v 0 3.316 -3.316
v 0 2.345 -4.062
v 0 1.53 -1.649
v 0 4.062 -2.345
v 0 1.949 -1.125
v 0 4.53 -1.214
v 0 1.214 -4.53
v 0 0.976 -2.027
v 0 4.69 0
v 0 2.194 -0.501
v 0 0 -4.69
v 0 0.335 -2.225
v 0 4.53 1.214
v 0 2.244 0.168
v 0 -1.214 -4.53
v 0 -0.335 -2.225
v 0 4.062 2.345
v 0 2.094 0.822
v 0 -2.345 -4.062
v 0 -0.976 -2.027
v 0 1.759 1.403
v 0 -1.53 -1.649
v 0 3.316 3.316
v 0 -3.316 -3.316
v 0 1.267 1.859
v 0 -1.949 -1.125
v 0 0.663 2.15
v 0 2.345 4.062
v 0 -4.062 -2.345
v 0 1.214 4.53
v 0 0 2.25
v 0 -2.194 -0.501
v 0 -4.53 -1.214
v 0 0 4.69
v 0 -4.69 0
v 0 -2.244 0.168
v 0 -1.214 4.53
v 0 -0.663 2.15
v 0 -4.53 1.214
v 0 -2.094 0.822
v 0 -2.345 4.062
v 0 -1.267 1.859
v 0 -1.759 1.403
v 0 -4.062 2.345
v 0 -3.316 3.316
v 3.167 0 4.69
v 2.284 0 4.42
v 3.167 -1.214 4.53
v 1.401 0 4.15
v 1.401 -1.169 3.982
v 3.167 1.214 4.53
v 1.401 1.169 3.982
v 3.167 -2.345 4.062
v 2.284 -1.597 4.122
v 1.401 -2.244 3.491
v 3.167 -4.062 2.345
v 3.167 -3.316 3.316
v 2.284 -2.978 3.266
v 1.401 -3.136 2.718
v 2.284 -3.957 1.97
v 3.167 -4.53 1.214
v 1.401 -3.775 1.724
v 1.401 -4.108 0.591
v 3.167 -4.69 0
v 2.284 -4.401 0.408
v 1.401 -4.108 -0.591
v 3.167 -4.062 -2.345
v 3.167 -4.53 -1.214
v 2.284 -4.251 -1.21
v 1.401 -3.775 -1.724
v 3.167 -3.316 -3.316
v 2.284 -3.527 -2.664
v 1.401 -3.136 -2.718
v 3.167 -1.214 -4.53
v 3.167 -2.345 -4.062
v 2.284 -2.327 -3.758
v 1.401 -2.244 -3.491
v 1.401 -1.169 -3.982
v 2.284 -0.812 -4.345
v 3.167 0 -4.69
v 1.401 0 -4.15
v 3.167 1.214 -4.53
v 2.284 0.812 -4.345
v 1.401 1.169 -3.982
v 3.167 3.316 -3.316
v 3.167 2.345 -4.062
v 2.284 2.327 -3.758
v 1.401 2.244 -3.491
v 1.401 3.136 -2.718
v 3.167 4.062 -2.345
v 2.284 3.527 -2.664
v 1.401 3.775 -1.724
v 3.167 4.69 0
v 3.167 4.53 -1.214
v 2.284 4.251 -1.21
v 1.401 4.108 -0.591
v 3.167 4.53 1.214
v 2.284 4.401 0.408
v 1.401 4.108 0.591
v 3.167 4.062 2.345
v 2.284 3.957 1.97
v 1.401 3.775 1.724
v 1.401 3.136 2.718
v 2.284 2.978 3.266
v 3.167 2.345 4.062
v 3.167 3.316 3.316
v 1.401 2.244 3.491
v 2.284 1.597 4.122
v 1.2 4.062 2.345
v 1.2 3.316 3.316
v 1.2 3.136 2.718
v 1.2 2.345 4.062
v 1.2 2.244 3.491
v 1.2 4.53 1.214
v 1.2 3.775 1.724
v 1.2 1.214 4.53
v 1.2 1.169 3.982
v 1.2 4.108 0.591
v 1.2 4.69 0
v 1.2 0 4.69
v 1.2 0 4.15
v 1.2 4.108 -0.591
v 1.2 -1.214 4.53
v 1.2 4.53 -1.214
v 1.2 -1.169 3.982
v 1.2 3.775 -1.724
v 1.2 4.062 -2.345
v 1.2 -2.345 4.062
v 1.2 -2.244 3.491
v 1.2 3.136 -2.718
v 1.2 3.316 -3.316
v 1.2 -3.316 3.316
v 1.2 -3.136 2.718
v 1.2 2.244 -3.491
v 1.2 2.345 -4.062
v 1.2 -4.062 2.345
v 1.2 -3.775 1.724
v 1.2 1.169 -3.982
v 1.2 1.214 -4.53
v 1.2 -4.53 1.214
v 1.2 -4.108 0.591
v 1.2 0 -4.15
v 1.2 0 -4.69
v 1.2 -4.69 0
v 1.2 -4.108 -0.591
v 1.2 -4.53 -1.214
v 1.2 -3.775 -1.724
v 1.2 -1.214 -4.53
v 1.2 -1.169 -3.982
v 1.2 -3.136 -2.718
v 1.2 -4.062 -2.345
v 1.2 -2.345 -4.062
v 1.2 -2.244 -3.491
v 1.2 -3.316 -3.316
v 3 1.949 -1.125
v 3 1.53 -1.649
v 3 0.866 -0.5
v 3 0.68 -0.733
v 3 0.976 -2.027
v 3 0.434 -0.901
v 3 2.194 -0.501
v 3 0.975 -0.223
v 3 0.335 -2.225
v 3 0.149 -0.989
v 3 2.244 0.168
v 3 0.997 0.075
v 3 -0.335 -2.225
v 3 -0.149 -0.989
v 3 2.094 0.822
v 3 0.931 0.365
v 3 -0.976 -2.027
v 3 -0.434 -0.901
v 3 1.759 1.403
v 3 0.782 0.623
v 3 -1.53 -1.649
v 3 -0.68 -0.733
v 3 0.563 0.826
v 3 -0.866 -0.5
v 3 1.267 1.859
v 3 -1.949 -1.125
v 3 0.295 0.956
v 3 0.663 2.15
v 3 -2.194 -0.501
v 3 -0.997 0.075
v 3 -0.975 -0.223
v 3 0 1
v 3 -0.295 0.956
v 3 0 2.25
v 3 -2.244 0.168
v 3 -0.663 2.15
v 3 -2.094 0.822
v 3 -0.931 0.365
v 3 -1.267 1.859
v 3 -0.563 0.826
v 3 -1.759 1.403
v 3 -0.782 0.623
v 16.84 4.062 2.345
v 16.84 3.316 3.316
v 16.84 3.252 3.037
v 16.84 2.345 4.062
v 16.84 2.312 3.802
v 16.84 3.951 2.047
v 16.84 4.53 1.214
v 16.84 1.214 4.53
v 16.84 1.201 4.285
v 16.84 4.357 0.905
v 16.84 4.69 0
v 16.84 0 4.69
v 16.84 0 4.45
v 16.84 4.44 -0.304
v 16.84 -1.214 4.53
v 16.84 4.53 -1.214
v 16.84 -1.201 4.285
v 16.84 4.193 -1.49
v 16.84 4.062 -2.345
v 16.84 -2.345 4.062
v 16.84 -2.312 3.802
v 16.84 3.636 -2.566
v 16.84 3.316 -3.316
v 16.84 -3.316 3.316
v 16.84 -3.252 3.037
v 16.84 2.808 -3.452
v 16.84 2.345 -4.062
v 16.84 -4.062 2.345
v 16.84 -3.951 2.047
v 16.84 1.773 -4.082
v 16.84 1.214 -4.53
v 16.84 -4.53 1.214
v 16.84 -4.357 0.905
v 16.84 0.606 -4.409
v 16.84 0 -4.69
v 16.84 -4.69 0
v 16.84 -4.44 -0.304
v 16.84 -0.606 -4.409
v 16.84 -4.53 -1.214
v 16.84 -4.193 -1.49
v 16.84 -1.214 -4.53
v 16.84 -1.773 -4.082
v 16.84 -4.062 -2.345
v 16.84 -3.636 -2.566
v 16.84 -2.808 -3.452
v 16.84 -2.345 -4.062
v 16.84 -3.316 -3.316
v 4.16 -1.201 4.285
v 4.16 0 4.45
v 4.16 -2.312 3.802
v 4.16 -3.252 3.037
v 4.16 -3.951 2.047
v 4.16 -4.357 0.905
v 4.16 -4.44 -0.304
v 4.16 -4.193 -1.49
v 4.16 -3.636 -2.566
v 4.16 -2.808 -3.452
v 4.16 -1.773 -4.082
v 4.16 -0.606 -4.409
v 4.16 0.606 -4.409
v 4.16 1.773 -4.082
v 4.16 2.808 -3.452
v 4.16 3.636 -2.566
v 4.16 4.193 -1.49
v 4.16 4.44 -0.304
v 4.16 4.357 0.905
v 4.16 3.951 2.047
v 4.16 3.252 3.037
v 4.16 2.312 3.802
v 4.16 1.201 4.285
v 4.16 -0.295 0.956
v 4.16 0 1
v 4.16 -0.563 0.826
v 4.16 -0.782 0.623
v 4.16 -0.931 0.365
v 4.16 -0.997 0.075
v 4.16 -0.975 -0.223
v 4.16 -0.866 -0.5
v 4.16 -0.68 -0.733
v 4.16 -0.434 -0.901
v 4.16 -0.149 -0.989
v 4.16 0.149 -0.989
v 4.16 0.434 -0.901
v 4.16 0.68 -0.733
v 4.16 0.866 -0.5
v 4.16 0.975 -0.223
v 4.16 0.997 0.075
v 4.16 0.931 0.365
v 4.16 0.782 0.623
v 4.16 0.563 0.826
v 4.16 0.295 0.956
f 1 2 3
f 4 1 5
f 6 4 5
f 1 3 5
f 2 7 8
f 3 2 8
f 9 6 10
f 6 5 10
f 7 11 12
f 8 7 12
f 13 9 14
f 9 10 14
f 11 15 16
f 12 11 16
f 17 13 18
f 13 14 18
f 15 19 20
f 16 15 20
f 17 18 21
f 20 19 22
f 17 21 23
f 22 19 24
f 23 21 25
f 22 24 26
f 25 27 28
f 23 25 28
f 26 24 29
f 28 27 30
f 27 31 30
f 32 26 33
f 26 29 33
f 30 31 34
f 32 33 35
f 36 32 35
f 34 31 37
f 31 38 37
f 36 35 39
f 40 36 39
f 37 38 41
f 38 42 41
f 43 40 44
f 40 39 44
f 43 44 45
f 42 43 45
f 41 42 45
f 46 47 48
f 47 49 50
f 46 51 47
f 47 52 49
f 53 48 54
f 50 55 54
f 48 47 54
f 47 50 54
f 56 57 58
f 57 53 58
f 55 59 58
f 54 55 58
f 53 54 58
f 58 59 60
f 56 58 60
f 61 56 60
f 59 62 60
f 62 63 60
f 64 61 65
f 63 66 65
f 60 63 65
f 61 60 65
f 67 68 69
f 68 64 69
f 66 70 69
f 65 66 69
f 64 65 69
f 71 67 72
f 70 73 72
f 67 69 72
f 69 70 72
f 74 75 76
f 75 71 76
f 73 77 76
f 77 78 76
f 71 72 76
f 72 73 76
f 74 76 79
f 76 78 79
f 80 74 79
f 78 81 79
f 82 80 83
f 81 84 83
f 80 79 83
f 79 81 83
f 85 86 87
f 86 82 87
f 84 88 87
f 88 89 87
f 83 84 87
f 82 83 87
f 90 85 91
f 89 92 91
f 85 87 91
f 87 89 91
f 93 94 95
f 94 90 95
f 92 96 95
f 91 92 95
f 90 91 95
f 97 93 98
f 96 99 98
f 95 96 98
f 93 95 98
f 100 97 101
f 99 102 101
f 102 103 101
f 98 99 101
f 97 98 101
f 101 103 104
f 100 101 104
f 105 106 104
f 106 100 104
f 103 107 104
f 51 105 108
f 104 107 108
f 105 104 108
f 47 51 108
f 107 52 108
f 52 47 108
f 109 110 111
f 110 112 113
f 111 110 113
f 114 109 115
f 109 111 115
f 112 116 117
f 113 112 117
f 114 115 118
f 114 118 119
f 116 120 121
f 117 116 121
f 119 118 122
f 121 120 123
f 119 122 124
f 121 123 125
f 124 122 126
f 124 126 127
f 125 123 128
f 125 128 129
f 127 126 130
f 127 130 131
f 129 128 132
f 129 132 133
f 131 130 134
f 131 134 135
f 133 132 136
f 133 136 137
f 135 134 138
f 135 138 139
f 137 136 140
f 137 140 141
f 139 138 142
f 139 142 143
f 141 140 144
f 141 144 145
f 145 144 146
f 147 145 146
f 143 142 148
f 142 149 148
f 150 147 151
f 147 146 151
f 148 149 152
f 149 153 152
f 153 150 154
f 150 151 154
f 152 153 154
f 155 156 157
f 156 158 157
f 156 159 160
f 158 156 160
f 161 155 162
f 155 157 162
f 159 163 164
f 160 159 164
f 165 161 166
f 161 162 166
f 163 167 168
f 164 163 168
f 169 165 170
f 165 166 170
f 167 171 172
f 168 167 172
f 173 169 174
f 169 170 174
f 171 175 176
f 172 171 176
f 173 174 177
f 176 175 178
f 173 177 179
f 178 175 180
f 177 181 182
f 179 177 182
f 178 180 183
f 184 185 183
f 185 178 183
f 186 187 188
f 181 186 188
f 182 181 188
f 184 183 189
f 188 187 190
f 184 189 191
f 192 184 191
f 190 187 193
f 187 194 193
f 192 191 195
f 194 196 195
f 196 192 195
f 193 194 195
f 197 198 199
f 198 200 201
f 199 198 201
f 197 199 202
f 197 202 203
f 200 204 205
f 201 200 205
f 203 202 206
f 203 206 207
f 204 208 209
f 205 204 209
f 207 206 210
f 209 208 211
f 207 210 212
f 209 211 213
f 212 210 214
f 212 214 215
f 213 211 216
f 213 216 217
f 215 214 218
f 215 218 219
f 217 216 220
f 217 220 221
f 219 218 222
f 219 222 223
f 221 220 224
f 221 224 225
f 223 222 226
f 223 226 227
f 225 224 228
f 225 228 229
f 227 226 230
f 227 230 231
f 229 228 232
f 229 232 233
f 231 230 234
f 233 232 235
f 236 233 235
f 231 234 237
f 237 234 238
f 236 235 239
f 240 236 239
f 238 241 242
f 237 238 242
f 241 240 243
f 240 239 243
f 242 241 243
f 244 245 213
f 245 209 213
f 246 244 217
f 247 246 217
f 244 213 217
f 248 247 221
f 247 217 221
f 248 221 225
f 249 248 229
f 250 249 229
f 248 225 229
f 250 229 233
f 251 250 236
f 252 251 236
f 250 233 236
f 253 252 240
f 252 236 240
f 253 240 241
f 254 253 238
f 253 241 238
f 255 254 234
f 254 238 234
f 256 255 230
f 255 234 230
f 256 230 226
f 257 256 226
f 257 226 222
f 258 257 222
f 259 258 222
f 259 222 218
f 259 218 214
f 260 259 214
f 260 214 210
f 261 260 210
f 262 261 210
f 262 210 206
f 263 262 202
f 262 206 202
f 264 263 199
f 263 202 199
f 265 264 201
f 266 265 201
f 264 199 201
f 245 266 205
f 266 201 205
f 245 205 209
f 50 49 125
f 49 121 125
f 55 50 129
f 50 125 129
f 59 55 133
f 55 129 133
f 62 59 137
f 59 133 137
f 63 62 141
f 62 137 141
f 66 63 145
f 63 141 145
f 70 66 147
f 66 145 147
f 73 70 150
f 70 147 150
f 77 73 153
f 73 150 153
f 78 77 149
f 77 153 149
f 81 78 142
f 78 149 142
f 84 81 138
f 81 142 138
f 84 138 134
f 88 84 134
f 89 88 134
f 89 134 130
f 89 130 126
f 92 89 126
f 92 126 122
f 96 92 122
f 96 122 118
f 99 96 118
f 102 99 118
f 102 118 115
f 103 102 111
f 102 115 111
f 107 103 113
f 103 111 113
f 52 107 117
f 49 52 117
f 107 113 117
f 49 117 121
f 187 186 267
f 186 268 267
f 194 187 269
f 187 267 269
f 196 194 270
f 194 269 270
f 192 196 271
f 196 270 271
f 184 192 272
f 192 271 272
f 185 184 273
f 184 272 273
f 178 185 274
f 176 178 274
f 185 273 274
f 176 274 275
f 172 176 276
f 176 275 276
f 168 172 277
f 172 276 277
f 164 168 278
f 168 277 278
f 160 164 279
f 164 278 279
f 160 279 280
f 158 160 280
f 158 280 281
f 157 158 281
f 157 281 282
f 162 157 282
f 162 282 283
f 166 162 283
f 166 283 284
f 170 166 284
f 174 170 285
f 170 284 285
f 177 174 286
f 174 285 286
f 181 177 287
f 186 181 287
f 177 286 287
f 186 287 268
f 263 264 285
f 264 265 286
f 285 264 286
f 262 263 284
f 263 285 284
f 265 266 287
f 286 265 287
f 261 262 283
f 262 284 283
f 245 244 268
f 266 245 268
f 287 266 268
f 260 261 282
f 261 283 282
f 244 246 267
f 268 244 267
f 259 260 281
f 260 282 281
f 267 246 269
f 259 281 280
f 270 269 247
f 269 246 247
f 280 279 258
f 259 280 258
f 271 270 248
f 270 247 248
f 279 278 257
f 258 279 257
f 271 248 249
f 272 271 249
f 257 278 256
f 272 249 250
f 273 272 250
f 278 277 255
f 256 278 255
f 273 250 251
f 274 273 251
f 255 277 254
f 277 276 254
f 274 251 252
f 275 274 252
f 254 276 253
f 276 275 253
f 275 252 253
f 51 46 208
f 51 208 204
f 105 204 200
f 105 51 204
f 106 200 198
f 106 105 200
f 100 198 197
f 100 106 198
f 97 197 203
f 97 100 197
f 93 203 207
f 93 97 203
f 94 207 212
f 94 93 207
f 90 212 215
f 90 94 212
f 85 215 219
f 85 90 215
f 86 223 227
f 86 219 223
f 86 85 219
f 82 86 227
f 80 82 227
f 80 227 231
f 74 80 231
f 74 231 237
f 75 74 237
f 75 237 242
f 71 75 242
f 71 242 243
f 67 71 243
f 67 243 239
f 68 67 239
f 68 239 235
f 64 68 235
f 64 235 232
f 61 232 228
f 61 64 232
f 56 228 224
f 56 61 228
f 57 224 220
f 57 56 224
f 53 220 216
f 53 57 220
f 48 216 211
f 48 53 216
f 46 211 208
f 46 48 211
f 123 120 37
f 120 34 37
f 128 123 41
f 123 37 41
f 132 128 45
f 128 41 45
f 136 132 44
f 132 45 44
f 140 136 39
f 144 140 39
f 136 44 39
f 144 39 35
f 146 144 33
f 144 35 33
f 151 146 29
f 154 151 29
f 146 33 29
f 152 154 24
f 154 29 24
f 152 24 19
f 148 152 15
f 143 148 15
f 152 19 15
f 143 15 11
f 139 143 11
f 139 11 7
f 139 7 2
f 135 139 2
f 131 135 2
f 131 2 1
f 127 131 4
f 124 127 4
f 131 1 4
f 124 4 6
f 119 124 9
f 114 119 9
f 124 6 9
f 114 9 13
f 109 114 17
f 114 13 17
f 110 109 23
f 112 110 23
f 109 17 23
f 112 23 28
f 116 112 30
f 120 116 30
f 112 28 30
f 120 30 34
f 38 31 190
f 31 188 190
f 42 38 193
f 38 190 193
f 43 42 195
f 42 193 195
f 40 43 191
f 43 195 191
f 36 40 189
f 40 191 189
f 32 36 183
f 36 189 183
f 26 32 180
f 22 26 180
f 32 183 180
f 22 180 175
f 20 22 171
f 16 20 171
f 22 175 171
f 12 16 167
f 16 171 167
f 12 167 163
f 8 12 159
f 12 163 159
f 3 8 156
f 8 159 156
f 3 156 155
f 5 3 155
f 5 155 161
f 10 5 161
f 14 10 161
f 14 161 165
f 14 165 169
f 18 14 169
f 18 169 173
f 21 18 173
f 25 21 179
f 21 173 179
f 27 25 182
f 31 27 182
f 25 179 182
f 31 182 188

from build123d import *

# Parameters (mm, degrees)
CHANFRO4_SIZE   = 0.55
CHANFRO4_SIZE_2 = 1.79896894


with BuildPart() as part:
    # Esboço1 → Revolução1 (revolve)
    with BuildSketch(Plane.XY, mode=Mode.PRIVATE) as revolu_o1_sk:
        Polygon((4.16, 1), (4.16, 4.45), (16.84, 4.45), (16.84, 4.69), (3.2, 4.69), (3.2, 4.15), (1.2, 4.15), (1.2, 4.69), (0, 4.69), (0, 2.25), (3, 2.25), (3, 1), align=None)
    revolve(revolu_o1_sk.sketch.rotate(Axis((0, 0, 0), (1, 0, 0)), 90), axis=Axis((0, 0, 0), (1, 0, 0)))

    # Chanfro4
    # the kernel refuses this chamfer: 1.79896894, 0.55 mm, written as the material it adds along each edge
    with BuildSketch(Plane(origin=(3.2, 0, 0), x_dir=(0, 0, 1), z_dir=(0, 1, 0))) as chanfro4_piece_1_section:
        Polygon((4.15 + CHANFRO4_SIZE, 0), (4.15, -CHANFRO4_SIZE_2), (4.15, 0), align=None)
    chanfro4_piece_1 = revolve(axis=Axis((3.2, 0, 0), (1, 0, 0)), mode=Mode.PRIVATE)
    chanfro4_piece_1 = chanfro4_piece_1 & Plane(origin=(2.25712916, 0, 0), x_dir=(0, 0, 1), z_dir=(-1, 0, 0)) * Cylinder(4.69, 19, mode=Mode.PRIVATE)
    add(chanfro4_piece_1)


solid = part.part
